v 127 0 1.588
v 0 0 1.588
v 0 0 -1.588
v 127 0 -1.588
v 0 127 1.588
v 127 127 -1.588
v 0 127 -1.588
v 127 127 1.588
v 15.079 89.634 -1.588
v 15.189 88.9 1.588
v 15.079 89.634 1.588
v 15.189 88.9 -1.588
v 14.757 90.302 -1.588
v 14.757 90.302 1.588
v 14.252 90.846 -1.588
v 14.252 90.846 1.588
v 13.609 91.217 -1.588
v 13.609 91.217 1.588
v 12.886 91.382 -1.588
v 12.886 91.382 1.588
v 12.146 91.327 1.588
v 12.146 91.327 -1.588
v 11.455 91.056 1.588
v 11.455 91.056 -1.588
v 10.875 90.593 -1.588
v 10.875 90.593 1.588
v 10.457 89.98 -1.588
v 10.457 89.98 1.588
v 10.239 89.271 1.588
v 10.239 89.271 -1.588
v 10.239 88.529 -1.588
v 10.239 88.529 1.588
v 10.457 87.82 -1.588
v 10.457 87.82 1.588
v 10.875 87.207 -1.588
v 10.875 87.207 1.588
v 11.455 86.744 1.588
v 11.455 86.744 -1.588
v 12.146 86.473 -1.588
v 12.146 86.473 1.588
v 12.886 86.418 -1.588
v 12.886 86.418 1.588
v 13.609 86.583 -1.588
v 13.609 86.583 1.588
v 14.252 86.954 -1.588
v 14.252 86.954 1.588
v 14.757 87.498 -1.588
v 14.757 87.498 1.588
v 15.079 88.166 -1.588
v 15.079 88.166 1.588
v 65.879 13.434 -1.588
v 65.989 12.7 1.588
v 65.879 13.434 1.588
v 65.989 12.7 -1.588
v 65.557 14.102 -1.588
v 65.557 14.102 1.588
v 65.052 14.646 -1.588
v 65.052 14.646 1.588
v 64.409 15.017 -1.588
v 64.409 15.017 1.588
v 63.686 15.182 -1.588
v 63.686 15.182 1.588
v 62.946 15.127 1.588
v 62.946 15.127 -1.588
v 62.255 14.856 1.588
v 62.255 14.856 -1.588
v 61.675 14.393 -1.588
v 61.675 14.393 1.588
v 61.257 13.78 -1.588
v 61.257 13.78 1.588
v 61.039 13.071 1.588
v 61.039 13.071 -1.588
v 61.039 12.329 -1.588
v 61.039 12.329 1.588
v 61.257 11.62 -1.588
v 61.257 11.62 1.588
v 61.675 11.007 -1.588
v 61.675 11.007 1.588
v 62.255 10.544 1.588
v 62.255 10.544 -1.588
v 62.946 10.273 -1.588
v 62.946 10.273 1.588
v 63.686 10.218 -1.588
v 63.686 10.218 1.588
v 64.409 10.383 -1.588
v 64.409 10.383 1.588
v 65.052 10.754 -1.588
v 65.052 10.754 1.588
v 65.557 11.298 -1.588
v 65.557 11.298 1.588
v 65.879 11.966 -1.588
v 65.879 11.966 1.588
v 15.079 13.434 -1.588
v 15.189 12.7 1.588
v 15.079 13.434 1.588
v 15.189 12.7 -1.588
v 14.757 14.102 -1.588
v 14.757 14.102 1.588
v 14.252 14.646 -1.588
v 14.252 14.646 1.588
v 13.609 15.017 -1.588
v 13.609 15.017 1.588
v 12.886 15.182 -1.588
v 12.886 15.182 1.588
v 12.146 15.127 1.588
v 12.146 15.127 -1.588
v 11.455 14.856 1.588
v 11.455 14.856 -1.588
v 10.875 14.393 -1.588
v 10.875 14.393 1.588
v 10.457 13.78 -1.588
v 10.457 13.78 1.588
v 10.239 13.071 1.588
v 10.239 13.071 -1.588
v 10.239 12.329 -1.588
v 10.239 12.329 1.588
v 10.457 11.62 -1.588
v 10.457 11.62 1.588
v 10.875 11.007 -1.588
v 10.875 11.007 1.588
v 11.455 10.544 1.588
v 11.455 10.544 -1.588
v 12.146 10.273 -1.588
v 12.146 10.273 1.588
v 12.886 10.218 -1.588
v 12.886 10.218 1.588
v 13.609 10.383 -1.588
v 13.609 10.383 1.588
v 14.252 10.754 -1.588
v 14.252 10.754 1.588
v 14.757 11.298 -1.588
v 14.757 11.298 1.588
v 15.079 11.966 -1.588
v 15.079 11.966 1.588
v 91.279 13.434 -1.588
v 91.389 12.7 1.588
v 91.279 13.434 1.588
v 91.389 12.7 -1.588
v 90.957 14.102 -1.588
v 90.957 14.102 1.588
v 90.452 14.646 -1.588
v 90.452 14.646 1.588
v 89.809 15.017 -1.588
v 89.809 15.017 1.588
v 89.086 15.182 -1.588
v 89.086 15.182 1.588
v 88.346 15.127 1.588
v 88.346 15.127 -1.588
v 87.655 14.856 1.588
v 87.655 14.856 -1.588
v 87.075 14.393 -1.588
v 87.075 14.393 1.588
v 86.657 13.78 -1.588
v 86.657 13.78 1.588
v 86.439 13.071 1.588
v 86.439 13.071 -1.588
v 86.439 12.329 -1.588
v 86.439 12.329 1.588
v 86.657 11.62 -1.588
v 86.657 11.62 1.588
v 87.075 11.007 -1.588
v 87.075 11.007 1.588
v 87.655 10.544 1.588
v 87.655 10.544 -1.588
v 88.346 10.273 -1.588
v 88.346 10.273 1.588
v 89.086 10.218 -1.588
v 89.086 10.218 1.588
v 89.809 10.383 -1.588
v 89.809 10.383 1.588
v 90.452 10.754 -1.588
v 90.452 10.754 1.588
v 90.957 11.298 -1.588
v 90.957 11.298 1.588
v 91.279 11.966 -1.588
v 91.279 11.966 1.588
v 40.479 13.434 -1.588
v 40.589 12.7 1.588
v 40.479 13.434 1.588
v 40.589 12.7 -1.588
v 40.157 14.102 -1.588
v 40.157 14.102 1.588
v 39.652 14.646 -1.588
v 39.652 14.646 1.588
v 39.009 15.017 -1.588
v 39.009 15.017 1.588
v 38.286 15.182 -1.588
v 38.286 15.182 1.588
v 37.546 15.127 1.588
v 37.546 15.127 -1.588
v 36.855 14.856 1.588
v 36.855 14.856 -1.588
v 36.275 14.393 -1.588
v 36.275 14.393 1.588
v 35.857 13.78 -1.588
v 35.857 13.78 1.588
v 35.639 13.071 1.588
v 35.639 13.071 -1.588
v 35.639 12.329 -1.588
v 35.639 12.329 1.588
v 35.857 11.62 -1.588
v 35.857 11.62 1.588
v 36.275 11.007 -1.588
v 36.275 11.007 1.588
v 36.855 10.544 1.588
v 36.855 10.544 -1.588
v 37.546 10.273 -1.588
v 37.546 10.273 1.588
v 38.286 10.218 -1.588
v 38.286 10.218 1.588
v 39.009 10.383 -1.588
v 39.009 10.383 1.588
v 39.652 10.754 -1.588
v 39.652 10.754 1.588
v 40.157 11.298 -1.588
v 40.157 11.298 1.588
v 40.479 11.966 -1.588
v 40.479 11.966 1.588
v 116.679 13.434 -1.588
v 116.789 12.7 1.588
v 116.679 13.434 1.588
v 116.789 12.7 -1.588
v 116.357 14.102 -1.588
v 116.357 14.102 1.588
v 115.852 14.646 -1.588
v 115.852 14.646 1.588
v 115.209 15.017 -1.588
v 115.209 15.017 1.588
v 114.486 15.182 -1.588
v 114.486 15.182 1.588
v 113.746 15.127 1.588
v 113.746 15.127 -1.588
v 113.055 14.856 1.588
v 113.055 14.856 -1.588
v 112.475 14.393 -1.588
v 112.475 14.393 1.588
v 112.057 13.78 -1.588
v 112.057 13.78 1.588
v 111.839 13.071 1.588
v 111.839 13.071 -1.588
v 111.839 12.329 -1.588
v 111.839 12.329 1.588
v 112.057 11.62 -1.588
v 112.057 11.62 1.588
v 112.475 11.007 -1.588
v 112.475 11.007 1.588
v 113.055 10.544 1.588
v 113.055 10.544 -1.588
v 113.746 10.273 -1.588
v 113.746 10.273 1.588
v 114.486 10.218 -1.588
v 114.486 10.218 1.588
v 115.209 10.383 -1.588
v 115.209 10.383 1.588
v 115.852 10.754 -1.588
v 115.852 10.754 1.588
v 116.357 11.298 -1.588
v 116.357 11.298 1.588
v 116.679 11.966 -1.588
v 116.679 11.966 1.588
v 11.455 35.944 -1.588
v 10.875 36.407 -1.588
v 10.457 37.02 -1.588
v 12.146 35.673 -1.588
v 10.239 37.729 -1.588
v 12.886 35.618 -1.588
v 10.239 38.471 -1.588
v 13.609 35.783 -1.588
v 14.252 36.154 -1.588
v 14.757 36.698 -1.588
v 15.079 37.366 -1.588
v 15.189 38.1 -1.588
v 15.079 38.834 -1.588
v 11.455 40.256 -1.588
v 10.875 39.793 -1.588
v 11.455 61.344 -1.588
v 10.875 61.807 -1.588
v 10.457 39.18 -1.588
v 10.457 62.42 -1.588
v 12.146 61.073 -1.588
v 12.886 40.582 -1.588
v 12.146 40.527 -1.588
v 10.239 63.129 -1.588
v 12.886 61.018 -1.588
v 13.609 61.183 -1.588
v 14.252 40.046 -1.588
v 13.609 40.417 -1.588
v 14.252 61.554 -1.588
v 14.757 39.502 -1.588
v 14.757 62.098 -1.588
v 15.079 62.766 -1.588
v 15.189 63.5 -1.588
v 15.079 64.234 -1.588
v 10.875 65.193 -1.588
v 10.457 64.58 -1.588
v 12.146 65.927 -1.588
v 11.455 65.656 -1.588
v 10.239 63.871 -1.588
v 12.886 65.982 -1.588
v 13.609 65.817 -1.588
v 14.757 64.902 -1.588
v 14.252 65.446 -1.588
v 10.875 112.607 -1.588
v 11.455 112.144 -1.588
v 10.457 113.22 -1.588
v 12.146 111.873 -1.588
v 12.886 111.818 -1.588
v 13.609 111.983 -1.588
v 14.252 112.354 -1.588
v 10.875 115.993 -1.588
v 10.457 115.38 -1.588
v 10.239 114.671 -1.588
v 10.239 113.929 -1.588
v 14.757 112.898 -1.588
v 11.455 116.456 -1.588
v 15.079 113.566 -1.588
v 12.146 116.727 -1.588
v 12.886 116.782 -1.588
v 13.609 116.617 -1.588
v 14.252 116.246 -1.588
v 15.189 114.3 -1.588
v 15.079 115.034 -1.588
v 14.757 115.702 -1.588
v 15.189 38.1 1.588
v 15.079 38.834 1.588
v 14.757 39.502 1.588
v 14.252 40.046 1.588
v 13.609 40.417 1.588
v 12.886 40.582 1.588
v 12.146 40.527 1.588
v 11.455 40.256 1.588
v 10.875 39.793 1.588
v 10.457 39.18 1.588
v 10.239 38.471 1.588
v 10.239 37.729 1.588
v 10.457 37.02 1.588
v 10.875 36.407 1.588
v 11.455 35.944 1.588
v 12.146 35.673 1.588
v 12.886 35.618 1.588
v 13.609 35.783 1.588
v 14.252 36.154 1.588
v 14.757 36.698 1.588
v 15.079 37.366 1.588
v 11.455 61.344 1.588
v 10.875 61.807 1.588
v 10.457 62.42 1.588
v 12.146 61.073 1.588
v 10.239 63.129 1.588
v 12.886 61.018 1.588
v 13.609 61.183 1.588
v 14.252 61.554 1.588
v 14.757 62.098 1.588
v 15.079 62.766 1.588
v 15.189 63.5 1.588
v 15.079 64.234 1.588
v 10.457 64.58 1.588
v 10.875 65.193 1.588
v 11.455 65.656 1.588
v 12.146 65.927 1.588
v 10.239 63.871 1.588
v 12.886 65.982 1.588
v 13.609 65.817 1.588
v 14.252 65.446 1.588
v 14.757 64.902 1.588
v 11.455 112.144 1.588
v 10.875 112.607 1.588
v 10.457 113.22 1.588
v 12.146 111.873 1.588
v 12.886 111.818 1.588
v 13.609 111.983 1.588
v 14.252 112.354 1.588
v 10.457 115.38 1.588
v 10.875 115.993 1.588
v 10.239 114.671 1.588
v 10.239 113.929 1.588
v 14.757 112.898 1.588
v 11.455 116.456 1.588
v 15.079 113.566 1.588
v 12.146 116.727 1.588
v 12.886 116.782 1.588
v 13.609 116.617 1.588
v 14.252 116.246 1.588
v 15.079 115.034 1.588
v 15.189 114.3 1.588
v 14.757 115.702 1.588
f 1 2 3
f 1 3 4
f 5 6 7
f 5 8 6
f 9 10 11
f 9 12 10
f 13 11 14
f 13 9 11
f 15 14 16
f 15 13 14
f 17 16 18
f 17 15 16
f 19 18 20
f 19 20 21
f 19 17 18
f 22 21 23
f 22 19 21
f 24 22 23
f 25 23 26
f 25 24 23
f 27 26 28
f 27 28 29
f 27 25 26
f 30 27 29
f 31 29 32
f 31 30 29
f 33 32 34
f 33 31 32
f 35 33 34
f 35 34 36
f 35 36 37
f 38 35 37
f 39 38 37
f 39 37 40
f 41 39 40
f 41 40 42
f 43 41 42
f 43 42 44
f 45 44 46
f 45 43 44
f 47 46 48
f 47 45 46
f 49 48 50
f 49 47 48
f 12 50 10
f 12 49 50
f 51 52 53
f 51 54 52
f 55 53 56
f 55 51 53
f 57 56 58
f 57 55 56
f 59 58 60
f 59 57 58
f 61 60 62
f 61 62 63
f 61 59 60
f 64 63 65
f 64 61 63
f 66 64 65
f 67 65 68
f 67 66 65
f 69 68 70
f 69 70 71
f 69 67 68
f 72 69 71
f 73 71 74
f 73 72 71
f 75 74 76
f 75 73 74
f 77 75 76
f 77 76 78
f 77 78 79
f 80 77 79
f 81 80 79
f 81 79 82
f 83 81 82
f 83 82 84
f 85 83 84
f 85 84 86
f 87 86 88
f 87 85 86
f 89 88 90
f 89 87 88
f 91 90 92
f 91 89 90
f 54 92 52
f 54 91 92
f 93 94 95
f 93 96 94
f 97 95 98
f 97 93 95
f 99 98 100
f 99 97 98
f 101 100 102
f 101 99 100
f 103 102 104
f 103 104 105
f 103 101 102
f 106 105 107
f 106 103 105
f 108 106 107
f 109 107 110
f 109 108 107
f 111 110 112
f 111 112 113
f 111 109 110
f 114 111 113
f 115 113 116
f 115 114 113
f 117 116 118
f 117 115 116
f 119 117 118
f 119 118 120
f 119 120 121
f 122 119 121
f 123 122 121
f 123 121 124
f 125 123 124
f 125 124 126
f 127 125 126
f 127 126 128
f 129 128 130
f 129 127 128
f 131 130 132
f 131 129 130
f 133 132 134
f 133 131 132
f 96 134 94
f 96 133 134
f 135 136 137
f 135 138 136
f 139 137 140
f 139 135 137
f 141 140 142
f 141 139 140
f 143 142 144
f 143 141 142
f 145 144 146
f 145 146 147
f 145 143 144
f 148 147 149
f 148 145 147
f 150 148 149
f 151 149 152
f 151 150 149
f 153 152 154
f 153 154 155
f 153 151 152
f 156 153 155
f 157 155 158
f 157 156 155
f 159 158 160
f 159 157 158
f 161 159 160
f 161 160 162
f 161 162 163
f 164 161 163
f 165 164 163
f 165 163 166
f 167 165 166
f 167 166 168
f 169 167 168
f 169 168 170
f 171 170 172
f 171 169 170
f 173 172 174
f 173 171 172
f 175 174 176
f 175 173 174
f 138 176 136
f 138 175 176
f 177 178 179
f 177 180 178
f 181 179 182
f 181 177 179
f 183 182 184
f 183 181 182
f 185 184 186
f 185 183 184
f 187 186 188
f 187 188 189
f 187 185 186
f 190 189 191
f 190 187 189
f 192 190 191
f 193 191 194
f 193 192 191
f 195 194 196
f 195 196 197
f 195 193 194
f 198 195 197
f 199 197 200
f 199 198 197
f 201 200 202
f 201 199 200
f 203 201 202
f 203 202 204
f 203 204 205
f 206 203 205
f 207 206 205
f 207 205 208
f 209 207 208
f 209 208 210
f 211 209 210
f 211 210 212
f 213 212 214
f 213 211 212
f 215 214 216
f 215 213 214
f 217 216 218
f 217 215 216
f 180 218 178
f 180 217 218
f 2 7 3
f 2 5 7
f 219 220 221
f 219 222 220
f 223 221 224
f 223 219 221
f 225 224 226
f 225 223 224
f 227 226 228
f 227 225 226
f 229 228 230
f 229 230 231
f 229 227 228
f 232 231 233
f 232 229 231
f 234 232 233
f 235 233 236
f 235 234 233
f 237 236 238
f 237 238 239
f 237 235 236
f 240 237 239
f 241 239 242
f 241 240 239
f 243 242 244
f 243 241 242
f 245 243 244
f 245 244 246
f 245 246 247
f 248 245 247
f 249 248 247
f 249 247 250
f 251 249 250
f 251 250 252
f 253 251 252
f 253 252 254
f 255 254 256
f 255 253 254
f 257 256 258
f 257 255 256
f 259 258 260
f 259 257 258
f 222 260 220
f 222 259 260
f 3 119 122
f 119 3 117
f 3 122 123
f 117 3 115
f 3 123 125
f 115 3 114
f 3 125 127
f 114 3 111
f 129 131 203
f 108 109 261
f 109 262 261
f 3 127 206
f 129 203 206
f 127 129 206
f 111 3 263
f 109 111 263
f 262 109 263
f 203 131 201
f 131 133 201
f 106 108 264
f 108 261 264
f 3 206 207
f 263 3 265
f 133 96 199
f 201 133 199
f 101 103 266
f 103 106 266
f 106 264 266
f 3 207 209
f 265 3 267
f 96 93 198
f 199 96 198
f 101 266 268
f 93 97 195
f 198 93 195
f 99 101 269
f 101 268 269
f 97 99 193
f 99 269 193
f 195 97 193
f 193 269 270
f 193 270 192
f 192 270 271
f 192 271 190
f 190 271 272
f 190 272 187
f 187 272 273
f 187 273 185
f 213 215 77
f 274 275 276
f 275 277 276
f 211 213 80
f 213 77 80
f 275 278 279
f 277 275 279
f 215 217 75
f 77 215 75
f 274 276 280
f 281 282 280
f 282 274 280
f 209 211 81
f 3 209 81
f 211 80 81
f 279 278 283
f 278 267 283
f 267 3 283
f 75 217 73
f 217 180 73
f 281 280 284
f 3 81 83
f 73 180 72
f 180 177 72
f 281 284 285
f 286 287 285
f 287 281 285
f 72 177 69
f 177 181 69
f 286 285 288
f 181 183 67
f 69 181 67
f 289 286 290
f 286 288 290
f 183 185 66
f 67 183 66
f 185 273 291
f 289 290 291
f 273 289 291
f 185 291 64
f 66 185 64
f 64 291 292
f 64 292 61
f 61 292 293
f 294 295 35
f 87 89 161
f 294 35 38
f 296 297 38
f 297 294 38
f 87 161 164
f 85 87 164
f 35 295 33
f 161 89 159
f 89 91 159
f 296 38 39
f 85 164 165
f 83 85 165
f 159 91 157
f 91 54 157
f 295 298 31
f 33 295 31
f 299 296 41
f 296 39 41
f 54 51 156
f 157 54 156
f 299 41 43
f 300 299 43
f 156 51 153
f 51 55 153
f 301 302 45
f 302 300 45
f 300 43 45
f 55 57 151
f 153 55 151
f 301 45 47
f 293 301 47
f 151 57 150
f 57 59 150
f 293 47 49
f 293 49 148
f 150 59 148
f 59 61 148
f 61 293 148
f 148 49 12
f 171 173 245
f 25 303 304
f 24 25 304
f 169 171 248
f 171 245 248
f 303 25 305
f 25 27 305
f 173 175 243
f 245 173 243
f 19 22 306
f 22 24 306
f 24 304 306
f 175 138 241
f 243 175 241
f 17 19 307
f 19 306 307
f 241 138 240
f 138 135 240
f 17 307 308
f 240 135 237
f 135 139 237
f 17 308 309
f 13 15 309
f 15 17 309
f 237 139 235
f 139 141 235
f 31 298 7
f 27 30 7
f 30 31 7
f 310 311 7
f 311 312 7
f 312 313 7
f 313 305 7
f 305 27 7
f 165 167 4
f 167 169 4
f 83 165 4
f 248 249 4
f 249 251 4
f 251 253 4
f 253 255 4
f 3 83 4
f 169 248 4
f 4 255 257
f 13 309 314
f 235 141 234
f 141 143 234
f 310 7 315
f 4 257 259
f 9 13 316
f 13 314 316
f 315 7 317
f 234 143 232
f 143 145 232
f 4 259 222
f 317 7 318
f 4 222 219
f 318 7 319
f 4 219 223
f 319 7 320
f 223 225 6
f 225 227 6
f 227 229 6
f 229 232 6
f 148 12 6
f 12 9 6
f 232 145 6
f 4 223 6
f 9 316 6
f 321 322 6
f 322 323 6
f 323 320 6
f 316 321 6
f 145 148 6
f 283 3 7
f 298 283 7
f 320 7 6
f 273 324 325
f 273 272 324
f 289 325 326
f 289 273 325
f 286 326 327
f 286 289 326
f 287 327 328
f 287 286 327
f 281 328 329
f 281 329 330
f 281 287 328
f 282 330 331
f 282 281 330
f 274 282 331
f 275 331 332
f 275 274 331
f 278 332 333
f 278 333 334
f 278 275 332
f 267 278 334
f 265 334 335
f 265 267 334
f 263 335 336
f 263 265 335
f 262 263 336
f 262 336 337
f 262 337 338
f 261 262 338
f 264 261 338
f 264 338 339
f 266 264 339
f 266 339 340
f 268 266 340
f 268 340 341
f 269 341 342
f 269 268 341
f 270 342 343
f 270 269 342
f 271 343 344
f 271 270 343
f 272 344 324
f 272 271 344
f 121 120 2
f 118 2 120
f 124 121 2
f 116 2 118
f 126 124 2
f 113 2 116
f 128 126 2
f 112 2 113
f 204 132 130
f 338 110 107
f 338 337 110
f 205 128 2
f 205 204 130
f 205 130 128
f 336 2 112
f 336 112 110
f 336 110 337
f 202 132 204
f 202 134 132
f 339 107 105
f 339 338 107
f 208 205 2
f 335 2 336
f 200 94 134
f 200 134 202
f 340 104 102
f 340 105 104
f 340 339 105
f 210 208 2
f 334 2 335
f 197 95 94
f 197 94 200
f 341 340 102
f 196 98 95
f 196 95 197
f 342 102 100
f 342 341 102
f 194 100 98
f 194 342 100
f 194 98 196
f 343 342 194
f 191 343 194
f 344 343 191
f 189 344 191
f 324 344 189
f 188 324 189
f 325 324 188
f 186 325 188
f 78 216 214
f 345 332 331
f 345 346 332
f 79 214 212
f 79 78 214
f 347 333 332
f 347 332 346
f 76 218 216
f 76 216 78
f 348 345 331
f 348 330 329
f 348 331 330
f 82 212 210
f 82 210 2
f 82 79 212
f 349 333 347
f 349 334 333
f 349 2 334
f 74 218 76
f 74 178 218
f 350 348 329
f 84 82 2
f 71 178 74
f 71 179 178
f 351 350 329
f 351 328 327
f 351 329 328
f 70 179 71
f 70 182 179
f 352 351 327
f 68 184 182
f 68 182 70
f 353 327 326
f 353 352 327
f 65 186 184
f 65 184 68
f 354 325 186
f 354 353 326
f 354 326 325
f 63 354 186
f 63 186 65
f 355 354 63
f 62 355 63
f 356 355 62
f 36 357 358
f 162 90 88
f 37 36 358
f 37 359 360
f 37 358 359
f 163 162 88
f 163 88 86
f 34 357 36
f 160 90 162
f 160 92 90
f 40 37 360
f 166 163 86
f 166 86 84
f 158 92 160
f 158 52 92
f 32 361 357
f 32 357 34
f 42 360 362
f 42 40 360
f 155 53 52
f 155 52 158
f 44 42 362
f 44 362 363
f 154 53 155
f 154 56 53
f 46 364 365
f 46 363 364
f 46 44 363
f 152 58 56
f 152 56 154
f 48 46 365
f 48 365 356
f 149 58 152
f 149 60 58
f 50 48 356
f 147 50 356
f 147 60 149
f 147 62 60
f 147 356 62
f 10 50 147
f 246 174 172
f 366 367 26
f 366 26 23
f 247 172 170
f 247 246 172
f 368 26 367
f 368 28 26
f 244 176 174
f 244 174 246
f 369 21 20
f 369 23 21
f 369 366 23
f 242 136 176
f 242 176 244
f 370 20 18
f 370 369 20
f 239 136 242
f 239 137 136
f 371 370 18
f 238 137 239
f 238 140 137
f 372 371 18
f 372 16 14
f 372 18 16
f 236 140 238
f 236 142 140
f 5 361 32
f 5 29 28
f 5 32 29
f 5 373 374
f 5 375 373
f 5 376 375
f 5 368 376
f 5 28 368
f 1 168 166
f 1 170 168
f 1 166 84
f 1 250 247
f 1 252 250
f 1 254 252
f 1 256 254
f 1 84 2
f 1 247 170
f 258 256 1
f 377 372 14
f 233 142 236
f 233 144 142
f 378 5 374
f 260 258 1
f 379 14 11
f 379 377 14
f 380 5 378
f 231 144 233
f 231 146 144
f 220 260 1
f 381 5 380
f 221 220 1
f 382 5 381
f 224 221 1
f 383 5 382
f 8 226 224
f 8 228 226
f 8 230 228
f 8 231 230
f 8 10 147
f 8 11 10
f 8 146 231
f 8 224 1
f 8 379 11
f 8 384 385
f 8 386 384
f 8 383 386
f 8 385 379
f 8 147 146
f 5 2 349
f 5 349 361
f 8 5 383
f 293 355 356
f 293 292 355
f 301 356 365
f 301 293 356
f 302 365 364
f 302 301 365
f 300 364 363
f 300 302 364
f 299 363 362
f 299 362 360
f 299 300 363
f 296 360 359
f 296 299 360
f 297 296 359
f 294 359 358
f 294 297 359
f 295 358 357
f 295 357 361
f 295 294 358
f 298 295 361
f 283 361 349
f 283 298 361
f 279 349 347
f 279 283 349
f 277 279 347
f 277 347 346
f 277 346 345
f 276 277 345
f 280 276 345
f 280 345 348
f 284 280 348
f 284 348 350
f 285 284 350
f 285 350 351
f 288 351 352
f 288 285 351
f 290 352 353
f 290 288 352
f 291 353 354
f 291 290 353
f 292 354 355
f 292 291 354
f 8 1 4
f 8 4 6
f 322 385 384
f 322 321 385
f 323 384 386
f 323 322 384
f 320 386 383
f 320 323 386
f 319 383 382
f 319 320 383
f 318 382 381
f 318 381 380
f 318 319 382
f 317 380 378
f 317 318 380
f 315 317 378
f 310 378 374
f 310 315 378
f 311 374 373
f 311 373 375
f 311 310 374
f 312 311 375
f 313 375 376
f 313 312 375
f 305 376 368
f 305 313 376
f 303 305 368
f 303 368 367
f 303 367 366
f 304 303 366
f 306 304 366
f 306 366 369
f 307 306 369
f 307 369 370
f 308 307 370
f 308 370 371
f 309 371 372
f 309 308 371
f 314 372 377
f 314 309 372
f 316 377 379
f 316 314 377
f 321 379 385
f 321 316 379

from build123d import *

# Parameters (mm, degrees)
SKETCH1_R           = 2.4892
BOSS_EXTRUDE1_DEPTH = 1.5875


with BuildPart() as part:
    # Sketch1 → Boss-Extrude1 (new, symmetric)
    with BuildSketch(Plane.XY):
        Polygon((0, 127), (0, 0), (127, 0), (127, 25.4), (127, 127), align=None)
        with Locations((114.3, 12.7)):
            Circle(SKETCH1_R, mode=Mode.SUBTRACT)
        with Locations((88.9, 12.7)):
            Circle(SKETCH1_R, mode=Mode.SUBTRACT)
        with Locations((63.5, 12.7)):
            Circle(SKETCH1_R, mode=Mode.SUBTRACT)
        with Locations((38.1, 12.7)):
            Circle(SKETCH1_R, mode=Mode.SUBTRACT)
        with Locations((12.7, 12.7)):
            Circle(SKETCH1_R, mode=Mode.SUBTRACT)
        with Locations((12.7, 38.1)):
            Circle(SKETCH1_R, mode=Mode.SUBTRACT)
        with Locations((12.7, 63.5)):
            Circle(SKETCH1_R, mode=Mode.SUBTRACT)
        with Locations((12.7, 88.9)):
            Circle(SKETCH1_R, mode=Mode.SUBTRACT)
        with Locations((12.7, 114.3)):
            Circle(SKETCH1_R, mode=Mode.SUBTRACT)
    extrude(amount=BOSS_EXTRUDE1_DEPTH, both=True)


solid = part.part
